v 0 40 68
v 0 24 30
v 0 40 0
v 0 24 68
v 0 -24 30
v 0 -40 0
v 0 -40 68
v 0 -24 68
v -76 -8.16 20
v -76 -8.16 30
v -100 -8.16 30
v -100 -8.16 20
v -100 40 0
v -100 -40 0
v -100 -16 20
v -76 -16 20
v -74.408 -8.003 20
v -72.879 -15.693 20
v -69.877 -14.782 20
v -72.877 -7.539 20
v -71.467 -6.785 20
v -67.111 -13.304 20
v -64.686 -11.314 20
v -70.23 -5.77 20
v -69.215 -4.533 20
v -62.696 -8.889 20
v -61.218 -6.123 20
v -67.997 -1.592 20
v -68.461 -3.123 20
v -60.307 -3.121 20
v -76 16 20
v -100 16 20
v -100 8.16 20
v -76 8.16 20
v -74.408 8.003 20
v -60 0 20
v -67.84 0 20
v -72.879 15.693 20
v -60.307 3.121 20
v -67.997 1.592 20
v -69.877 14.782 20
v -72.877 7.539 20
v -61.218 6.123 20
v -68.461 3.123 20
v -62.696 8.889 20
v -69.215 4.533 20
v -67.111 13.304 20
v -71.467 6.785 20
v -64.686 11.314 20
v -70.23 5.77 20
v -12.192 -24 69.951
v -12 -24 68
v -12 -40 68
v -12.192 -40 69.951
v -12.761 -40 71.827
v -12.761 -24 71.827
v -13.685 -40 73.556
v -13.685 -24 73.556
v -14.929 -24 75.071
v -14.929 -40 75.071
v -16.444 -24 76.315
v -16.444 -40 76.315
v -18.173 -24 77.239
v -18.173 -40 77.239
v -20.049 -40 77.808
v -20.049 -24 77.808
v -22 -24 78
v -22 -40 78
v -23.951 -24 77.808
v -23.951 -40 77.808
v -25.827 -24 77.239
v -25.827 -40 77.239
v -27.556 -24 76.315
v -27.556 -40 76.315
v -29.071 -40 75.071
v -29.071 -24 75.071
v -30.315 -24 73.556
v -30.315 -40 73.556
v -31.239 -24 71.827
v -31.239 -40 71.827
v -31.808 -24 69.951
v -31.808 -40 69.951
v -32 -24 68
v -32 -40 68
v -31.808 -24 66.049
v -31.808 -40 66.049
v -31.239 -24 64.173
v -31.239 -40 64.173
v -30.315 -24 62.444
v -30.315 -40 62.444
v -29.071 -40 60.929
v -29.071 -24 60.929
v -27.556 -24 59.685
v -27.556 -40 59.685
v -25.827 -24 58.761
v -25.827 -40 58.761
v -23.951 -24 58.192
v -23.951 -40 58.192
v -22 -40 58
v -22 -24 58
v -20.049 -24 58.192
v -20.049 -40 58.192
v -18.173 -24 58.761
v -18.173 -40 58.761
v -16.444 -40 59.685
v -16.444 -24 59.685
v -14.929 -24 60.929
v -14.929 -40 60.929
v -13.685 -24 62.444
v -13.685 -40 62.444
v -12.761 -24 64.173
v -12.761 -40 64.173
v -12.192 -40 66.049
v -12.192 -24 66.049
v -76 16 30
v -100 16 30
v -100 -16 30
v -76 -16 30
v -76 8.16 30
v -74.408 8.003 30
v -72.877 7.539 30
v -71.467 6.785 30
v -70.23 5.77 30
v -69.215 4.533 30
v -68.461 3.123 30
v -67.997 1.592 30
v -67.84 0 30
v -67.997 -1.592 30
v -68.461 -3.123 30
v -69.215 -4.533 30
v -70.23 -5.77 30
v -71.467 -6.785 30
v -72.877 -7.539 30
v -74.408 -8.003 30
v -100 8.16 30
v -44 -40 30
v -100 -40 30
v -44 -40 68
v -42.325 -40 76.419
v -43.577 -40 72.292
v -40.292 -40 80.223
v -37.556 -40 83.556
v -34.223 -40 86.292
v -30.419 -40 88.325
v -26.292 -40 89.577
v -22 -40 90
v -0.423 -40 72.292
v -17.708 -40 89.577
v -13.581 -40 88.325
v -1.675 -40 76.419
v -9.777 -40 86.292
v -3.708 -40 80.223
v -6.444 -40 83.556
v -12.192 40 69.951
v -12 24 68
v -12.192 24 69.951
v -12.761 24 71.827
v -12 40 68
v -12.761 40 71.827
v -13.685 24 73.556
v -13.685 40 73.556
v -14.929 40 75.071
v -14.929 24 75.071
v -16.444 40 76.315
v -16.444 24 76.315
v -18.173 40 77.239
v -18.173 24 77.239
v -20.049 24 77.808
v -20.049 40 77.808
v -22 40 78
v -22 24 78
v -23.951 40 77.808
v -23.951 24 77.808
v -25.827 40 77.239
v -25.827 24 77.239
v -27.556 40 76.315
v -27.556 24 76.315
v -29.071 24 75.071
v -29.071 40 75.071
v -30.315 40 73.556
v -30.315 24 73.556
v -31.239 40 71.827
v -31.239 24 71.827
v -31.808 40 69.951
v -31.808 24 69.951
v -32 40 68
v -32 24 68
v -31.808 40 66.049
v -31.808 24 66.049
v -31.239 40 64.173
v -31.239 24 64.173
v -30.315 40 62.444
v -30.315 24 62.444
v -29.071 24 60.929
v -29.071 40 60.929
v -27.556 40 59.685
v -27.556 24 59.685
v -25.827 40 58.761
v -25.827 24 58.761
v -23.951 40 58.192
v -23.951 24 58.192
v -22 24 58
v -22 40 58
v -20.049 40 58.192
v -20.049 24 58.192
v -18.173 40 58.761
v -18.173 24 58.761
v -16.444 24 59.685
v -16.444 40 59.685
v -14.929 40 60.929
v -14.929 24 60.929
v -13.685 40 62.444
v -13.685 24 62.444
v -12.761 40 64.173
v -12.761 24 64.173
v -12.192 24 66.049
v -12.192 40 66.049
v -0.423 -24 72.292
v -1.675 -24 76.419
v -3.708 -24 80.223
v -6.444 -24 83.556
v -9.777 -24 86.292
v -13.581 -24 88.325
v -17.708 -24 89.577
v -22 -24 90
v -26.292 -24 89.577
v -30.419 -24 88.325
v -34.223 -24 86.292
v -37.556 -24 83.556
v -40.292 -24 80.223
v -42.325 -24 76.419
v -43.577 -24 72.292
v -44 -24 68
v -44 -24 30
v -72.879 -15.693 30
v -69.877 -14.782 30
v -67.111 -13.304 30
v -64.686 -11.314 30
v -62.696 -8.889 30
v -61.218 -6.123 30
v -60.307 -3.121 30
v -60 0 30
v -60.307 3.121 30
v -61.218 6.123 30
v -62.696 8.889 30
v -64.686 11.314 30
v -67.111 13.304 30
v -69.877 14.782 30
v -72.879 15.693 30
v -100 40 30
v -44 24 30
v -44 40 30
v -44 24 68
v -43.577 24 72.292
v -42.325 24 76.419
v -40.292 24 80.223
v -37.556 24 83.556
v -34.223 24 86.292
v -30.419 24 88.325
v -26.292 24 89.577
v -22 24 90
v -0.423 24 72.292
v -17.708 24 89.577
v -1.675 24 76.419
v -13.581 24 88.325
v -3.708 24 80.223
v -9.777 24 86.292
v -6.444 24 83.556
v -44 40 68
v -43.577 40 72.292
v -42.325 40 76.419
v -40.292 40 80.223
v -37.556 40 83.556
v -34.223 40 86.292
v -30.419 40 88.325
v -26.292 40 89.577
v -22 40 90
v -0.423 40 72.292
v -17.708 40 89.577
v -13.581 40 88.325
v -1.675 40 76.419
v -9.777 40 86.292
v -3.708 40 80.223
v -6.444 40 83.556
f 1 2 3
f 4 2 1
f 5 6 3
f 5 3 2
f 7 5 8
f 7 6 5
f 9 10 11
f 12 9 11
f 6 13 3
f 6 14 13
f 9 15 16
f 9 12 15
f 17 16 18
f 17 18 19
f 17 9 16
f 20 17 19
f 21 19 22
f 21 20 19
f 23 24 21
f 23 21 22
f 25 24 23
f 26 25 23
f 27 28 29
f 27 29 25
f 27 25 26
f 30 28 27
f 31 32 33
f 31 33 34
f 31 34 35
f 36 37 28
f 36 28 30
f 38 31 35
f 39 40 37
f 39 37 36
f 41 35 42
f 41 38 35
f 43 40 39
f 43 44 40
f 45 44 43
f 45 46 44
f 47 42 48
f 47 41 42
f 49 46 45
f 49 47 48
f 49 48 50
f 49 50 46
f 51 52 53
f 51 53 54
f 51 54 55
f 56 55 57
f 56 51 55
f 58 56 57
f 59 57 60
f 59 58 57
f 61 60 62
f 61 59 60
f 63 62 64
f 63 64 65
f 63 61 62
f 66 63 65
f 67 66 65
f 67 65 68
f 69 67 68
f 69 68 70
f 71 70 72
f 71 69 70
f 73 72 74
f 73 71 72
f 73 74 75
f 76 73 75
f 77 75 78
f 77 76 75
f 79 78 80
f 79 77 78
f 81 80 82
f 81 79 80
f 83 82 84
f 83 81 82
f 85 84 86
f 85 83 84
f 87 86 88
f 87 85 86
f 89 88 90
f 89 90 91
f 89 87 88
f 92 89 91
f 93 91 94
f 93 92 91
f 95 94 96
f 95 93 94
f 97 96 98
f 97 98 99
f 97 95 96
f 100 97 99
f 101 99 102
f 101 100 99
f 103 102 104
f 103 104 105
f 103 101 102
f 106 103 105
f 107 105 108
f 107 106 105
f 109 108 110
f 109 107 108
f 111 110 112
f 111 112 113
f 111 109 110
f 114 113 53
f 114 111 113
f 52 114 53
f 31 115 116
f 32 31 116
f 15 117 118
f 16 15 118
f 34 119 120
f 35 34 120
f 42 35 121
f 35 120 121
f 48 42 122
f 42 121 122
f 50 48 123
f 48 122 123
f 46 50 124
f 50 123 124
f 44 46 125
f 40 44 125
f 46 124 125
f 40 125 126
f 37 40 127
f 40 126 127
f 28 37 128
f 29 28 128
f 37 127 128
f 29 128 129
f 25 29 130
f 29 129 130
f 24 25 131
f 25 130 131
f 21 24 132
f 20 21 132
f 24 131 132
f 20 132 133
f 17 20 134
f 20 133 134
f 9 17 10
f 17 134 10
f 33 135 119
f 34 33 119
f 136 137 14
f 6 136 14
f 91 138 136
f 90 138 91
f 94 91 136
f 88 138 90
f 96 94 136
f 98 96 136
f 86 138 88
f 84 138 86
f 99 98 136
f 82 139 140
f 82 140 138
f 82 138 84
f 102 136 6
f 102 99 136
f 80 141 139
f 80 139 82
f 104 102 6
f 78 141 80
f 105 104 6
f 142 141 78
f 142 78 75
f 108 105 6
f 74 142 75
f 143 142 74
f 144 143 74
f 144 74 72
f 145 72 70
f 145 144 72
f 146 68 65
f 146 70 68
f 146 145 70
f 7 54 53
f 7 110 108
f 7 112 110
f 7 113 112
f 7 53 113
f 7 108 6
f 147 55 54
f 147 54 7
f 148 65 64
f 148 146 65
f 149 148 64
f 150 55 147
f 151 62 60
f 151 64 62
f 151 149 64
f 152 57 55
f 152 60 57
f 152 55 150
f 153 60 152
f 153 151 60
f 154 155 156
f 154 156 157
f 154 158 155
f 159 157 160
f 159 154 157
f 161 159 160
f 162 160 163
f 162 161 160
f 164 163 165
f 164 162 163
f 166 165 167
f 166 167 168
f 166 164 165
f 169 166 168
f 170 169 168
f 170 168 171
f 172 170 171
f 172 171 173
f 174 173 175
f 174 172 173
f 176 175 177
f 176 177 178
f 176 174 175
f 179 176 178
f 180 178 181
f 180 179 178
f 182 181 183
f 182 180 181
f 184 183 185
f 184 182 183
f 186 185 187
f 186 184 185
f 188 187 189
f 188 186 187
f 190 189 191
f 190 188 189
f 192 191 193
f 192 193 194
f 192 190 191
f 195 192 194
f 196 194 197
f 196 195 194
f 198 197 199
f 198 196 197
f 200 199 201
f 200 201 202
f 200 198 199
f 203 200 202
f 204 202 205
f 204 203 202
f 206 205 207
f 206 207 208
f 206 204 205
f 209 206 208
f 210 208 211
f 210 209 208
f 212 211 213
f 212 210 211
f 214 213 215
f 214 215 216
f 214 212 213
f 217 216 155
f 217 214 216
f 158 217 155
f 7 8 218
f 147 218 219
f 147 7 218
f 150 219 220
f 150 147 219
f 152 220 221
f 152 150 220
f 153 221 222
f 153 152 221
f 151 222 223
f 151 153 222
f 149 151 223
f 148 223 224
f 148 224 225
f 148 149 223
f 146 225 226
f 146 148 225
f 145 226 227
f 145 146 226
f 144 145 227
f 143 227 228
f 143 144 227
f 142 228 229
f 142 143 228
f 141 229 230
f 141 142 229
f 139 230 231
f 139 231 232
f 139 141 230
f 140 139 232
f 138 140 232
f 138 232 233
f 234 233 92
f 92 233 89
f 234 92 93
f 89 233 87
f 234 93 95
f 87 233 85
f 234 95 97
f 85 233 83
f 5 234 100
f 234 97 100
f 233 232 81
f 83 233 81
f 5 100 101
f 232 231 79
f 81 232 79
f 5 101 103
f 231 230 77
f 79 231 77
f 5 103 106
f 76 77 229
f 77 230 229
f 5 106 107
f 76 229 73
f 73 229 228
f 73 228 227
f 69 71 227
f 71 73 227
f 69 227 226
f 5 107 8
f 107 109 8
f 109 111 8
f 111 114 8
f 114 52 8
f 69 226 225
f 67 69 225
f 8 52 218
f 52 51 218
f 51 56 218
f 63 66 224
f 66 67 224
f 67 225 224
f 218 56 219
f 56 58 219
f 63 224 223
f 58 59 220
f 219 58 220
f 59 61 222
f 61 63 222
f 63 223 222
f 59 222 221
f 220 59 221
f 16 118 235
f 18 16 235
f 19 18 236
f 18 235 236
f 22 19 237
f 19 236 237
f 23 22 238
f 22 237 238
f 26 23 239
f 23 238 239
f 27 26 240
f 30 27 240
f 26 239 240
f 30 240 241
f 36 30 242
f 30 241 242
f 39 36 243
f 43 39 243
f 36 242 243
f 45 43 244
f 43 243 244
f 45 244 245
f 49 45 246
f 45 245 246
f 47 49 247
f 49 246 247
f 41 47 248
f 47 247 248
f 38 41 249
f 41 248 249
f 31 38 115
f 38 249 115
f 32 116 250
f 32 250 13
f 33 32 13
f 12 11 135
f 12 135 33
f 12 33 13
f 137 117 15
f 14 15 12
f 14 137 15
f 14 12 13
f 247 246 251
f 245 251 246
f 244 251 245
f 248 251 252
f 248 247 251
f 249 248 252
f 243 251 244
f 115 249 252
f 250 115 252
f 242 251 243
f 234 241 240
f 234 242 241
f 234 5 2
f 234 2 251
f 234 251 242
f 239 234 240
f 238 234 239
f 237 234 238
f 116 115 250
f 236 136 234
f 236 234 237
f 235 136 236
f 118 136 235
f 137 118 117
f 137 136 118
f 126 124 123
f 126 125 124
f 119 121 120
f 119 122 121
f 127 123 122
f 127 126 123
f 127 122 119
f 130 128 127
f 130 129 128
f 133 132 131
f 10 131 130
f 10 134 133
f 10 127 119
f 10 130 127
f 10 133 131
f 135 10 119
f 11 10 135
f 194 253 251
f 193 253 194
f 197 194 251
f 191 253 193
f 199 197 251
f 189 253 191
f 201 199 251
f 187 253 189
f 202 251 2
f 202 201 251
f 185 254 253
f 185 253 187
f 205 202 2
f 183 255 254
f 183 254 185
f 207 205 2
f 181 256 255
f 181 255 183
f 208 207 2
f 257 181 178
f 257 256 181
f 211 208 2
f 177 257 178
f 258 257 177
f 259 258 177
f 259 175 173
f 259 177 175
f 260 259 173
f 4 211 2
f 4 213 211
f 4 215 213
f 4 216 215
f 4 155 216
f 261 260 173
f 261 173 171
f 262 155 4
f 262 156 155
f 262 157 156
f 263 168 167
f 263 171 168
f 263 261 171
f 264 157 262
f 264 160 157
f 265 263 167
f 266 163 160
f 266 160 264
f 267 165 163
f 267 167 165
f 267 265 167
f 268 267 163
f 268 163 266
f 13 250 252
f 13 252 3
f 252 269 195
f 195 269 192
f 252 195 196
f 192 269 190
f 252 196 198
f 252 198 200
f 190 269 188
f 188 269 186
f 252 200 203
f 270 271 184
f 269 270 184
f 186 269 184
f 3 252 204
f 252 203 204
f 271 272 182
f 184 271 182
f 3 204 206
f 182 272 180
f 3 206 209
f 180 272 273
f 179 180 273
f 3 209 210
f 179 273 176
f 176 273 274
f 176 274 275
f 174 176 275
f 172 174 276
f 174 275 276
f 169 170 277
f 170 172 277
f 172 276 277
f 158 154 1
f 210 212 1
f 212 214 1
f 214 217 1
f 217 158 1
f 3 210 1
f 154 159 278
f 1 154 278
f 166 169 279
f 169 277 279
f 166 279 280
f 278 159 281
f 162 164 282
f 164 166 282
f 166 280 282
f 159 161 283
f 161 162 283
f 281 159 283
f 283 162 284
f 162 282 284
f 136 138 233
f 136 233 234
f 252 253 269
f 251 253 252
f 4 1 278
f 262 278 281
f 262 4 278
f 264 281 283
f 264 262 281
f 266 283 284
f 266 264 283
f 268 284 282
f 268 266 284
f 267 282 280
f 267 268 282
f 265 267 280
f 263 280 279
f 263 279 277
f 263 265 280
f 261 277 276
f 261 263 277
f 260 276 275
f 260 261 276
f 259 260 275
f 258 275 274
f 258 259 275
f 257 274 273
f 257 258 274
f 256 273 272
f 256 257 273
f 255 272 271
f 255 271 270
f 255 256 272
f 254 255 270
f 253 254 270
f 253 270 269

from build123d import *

# Parameters (mm, degrees)
F0_R     = 10
F1_DEPTH = 40
F2_DEPTH = 24
F4_DEPTH = 10


with BuildPart() as f1:
    # F0 (on Front) → F1 (new body, symmetric)
    with BuildSketch(Plane.XZ):
        Polygon((-100, 0), (0, 0), (0, 30), (-44, 30), (-100, 30), align=None)
        with BuildLine():
            Line((-44, 30), (0, 30))
            Line((0, 30), (0, 68))
            ThreePointArc((0, 68), (-22, 90), (-44, 68))
            Line((-44, 68), (-44, 30))
        make_face()
        with Locations((-22, 68)):
            Circle(F0_R, mode=Mode.SUBTRACT)
    extrude(amount=F1_DEPTH, both=True)

    # F0 (on Front) → F2 (cut, symmetric)
    with BuildSketch(Plane.XZ):
        with BuildLine():
            Line((-44, 30), (0, 30))
            Line((0, 30), (0, 68))
            ThreePointArc((0, 68), (-22, 90), (-44, 68))
            Line((-44, 68), (-44, 30))
        make_face()
        with Locations((-22, 68)):
            Circle(F0_R, mode=Mode.SUBTRACT)
    extrude(amount=F2_DEPTH, both=True, mode=Mode.SUBTRACT)

    # F3 (on face) → F4 (cut)
    with BuildSketch(Plane.XY.offset(30)):
        with BuildLine():
            Line((-100, -16), (-76, -16))
            ThreePointArc((-76, -16), (-60, 0), (-76, 16))
            Line((-76, 16), (-100, 16))
            Line((-100, 16), (-100, 8.16))
            Line((-100, 8.16), (-76, 8.16))
            ThreePointArc((-76, 8.16), (-67.84, 0), (-76, -8.16))
            Line((-76, -8.16), (-100, -8.16))
            Line((-100, -8.16), (-100, -16))
        make_face()
    extrude(amount=-F4_DEPTH, mode=Mode.SUBTRACT)


solid = f1.part
